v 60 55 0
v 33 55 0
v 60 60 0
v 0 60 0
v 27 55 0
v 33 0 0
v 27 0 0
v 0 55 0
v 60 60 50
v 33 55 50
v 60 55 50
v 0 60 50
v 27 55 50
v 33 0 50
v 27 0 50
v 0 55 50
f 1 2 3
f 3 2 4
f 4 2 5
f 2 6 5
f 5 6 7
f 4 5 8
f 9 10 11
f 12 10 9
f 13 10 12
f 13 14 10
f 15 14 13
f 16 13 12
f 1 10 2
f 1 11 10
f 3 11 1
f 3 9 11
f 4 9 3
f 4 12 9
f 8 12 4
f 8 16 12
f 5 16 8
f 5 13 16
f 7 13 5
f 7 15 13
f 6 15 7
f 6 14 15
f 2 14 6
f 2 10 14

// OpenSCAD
$fn = 32;

// ----------------------------------------------------------------------
// Structural section: tee 60 x 60 mm
// ----------------------------------------------------------------------

// --- parameters (mm) ---
sec_w = 60;               // tee width, X
sec_h = 60;               // tee height, Y
flange_t = 5;             // top flange thickness
web_t = 6;                // web thickness
plate_t = 50;             // cut length, Z (extrusion height)

profile = [[27, 0], [33, 0], [33, 55], [60, 55], [60, 60], [0, 60], [0, 55], [27, 55]];  // primary outline, 8 points, counter clockwise

// --- the one profile operation ---
linear_extrude(height = plate_t) polygon(points = profile);
